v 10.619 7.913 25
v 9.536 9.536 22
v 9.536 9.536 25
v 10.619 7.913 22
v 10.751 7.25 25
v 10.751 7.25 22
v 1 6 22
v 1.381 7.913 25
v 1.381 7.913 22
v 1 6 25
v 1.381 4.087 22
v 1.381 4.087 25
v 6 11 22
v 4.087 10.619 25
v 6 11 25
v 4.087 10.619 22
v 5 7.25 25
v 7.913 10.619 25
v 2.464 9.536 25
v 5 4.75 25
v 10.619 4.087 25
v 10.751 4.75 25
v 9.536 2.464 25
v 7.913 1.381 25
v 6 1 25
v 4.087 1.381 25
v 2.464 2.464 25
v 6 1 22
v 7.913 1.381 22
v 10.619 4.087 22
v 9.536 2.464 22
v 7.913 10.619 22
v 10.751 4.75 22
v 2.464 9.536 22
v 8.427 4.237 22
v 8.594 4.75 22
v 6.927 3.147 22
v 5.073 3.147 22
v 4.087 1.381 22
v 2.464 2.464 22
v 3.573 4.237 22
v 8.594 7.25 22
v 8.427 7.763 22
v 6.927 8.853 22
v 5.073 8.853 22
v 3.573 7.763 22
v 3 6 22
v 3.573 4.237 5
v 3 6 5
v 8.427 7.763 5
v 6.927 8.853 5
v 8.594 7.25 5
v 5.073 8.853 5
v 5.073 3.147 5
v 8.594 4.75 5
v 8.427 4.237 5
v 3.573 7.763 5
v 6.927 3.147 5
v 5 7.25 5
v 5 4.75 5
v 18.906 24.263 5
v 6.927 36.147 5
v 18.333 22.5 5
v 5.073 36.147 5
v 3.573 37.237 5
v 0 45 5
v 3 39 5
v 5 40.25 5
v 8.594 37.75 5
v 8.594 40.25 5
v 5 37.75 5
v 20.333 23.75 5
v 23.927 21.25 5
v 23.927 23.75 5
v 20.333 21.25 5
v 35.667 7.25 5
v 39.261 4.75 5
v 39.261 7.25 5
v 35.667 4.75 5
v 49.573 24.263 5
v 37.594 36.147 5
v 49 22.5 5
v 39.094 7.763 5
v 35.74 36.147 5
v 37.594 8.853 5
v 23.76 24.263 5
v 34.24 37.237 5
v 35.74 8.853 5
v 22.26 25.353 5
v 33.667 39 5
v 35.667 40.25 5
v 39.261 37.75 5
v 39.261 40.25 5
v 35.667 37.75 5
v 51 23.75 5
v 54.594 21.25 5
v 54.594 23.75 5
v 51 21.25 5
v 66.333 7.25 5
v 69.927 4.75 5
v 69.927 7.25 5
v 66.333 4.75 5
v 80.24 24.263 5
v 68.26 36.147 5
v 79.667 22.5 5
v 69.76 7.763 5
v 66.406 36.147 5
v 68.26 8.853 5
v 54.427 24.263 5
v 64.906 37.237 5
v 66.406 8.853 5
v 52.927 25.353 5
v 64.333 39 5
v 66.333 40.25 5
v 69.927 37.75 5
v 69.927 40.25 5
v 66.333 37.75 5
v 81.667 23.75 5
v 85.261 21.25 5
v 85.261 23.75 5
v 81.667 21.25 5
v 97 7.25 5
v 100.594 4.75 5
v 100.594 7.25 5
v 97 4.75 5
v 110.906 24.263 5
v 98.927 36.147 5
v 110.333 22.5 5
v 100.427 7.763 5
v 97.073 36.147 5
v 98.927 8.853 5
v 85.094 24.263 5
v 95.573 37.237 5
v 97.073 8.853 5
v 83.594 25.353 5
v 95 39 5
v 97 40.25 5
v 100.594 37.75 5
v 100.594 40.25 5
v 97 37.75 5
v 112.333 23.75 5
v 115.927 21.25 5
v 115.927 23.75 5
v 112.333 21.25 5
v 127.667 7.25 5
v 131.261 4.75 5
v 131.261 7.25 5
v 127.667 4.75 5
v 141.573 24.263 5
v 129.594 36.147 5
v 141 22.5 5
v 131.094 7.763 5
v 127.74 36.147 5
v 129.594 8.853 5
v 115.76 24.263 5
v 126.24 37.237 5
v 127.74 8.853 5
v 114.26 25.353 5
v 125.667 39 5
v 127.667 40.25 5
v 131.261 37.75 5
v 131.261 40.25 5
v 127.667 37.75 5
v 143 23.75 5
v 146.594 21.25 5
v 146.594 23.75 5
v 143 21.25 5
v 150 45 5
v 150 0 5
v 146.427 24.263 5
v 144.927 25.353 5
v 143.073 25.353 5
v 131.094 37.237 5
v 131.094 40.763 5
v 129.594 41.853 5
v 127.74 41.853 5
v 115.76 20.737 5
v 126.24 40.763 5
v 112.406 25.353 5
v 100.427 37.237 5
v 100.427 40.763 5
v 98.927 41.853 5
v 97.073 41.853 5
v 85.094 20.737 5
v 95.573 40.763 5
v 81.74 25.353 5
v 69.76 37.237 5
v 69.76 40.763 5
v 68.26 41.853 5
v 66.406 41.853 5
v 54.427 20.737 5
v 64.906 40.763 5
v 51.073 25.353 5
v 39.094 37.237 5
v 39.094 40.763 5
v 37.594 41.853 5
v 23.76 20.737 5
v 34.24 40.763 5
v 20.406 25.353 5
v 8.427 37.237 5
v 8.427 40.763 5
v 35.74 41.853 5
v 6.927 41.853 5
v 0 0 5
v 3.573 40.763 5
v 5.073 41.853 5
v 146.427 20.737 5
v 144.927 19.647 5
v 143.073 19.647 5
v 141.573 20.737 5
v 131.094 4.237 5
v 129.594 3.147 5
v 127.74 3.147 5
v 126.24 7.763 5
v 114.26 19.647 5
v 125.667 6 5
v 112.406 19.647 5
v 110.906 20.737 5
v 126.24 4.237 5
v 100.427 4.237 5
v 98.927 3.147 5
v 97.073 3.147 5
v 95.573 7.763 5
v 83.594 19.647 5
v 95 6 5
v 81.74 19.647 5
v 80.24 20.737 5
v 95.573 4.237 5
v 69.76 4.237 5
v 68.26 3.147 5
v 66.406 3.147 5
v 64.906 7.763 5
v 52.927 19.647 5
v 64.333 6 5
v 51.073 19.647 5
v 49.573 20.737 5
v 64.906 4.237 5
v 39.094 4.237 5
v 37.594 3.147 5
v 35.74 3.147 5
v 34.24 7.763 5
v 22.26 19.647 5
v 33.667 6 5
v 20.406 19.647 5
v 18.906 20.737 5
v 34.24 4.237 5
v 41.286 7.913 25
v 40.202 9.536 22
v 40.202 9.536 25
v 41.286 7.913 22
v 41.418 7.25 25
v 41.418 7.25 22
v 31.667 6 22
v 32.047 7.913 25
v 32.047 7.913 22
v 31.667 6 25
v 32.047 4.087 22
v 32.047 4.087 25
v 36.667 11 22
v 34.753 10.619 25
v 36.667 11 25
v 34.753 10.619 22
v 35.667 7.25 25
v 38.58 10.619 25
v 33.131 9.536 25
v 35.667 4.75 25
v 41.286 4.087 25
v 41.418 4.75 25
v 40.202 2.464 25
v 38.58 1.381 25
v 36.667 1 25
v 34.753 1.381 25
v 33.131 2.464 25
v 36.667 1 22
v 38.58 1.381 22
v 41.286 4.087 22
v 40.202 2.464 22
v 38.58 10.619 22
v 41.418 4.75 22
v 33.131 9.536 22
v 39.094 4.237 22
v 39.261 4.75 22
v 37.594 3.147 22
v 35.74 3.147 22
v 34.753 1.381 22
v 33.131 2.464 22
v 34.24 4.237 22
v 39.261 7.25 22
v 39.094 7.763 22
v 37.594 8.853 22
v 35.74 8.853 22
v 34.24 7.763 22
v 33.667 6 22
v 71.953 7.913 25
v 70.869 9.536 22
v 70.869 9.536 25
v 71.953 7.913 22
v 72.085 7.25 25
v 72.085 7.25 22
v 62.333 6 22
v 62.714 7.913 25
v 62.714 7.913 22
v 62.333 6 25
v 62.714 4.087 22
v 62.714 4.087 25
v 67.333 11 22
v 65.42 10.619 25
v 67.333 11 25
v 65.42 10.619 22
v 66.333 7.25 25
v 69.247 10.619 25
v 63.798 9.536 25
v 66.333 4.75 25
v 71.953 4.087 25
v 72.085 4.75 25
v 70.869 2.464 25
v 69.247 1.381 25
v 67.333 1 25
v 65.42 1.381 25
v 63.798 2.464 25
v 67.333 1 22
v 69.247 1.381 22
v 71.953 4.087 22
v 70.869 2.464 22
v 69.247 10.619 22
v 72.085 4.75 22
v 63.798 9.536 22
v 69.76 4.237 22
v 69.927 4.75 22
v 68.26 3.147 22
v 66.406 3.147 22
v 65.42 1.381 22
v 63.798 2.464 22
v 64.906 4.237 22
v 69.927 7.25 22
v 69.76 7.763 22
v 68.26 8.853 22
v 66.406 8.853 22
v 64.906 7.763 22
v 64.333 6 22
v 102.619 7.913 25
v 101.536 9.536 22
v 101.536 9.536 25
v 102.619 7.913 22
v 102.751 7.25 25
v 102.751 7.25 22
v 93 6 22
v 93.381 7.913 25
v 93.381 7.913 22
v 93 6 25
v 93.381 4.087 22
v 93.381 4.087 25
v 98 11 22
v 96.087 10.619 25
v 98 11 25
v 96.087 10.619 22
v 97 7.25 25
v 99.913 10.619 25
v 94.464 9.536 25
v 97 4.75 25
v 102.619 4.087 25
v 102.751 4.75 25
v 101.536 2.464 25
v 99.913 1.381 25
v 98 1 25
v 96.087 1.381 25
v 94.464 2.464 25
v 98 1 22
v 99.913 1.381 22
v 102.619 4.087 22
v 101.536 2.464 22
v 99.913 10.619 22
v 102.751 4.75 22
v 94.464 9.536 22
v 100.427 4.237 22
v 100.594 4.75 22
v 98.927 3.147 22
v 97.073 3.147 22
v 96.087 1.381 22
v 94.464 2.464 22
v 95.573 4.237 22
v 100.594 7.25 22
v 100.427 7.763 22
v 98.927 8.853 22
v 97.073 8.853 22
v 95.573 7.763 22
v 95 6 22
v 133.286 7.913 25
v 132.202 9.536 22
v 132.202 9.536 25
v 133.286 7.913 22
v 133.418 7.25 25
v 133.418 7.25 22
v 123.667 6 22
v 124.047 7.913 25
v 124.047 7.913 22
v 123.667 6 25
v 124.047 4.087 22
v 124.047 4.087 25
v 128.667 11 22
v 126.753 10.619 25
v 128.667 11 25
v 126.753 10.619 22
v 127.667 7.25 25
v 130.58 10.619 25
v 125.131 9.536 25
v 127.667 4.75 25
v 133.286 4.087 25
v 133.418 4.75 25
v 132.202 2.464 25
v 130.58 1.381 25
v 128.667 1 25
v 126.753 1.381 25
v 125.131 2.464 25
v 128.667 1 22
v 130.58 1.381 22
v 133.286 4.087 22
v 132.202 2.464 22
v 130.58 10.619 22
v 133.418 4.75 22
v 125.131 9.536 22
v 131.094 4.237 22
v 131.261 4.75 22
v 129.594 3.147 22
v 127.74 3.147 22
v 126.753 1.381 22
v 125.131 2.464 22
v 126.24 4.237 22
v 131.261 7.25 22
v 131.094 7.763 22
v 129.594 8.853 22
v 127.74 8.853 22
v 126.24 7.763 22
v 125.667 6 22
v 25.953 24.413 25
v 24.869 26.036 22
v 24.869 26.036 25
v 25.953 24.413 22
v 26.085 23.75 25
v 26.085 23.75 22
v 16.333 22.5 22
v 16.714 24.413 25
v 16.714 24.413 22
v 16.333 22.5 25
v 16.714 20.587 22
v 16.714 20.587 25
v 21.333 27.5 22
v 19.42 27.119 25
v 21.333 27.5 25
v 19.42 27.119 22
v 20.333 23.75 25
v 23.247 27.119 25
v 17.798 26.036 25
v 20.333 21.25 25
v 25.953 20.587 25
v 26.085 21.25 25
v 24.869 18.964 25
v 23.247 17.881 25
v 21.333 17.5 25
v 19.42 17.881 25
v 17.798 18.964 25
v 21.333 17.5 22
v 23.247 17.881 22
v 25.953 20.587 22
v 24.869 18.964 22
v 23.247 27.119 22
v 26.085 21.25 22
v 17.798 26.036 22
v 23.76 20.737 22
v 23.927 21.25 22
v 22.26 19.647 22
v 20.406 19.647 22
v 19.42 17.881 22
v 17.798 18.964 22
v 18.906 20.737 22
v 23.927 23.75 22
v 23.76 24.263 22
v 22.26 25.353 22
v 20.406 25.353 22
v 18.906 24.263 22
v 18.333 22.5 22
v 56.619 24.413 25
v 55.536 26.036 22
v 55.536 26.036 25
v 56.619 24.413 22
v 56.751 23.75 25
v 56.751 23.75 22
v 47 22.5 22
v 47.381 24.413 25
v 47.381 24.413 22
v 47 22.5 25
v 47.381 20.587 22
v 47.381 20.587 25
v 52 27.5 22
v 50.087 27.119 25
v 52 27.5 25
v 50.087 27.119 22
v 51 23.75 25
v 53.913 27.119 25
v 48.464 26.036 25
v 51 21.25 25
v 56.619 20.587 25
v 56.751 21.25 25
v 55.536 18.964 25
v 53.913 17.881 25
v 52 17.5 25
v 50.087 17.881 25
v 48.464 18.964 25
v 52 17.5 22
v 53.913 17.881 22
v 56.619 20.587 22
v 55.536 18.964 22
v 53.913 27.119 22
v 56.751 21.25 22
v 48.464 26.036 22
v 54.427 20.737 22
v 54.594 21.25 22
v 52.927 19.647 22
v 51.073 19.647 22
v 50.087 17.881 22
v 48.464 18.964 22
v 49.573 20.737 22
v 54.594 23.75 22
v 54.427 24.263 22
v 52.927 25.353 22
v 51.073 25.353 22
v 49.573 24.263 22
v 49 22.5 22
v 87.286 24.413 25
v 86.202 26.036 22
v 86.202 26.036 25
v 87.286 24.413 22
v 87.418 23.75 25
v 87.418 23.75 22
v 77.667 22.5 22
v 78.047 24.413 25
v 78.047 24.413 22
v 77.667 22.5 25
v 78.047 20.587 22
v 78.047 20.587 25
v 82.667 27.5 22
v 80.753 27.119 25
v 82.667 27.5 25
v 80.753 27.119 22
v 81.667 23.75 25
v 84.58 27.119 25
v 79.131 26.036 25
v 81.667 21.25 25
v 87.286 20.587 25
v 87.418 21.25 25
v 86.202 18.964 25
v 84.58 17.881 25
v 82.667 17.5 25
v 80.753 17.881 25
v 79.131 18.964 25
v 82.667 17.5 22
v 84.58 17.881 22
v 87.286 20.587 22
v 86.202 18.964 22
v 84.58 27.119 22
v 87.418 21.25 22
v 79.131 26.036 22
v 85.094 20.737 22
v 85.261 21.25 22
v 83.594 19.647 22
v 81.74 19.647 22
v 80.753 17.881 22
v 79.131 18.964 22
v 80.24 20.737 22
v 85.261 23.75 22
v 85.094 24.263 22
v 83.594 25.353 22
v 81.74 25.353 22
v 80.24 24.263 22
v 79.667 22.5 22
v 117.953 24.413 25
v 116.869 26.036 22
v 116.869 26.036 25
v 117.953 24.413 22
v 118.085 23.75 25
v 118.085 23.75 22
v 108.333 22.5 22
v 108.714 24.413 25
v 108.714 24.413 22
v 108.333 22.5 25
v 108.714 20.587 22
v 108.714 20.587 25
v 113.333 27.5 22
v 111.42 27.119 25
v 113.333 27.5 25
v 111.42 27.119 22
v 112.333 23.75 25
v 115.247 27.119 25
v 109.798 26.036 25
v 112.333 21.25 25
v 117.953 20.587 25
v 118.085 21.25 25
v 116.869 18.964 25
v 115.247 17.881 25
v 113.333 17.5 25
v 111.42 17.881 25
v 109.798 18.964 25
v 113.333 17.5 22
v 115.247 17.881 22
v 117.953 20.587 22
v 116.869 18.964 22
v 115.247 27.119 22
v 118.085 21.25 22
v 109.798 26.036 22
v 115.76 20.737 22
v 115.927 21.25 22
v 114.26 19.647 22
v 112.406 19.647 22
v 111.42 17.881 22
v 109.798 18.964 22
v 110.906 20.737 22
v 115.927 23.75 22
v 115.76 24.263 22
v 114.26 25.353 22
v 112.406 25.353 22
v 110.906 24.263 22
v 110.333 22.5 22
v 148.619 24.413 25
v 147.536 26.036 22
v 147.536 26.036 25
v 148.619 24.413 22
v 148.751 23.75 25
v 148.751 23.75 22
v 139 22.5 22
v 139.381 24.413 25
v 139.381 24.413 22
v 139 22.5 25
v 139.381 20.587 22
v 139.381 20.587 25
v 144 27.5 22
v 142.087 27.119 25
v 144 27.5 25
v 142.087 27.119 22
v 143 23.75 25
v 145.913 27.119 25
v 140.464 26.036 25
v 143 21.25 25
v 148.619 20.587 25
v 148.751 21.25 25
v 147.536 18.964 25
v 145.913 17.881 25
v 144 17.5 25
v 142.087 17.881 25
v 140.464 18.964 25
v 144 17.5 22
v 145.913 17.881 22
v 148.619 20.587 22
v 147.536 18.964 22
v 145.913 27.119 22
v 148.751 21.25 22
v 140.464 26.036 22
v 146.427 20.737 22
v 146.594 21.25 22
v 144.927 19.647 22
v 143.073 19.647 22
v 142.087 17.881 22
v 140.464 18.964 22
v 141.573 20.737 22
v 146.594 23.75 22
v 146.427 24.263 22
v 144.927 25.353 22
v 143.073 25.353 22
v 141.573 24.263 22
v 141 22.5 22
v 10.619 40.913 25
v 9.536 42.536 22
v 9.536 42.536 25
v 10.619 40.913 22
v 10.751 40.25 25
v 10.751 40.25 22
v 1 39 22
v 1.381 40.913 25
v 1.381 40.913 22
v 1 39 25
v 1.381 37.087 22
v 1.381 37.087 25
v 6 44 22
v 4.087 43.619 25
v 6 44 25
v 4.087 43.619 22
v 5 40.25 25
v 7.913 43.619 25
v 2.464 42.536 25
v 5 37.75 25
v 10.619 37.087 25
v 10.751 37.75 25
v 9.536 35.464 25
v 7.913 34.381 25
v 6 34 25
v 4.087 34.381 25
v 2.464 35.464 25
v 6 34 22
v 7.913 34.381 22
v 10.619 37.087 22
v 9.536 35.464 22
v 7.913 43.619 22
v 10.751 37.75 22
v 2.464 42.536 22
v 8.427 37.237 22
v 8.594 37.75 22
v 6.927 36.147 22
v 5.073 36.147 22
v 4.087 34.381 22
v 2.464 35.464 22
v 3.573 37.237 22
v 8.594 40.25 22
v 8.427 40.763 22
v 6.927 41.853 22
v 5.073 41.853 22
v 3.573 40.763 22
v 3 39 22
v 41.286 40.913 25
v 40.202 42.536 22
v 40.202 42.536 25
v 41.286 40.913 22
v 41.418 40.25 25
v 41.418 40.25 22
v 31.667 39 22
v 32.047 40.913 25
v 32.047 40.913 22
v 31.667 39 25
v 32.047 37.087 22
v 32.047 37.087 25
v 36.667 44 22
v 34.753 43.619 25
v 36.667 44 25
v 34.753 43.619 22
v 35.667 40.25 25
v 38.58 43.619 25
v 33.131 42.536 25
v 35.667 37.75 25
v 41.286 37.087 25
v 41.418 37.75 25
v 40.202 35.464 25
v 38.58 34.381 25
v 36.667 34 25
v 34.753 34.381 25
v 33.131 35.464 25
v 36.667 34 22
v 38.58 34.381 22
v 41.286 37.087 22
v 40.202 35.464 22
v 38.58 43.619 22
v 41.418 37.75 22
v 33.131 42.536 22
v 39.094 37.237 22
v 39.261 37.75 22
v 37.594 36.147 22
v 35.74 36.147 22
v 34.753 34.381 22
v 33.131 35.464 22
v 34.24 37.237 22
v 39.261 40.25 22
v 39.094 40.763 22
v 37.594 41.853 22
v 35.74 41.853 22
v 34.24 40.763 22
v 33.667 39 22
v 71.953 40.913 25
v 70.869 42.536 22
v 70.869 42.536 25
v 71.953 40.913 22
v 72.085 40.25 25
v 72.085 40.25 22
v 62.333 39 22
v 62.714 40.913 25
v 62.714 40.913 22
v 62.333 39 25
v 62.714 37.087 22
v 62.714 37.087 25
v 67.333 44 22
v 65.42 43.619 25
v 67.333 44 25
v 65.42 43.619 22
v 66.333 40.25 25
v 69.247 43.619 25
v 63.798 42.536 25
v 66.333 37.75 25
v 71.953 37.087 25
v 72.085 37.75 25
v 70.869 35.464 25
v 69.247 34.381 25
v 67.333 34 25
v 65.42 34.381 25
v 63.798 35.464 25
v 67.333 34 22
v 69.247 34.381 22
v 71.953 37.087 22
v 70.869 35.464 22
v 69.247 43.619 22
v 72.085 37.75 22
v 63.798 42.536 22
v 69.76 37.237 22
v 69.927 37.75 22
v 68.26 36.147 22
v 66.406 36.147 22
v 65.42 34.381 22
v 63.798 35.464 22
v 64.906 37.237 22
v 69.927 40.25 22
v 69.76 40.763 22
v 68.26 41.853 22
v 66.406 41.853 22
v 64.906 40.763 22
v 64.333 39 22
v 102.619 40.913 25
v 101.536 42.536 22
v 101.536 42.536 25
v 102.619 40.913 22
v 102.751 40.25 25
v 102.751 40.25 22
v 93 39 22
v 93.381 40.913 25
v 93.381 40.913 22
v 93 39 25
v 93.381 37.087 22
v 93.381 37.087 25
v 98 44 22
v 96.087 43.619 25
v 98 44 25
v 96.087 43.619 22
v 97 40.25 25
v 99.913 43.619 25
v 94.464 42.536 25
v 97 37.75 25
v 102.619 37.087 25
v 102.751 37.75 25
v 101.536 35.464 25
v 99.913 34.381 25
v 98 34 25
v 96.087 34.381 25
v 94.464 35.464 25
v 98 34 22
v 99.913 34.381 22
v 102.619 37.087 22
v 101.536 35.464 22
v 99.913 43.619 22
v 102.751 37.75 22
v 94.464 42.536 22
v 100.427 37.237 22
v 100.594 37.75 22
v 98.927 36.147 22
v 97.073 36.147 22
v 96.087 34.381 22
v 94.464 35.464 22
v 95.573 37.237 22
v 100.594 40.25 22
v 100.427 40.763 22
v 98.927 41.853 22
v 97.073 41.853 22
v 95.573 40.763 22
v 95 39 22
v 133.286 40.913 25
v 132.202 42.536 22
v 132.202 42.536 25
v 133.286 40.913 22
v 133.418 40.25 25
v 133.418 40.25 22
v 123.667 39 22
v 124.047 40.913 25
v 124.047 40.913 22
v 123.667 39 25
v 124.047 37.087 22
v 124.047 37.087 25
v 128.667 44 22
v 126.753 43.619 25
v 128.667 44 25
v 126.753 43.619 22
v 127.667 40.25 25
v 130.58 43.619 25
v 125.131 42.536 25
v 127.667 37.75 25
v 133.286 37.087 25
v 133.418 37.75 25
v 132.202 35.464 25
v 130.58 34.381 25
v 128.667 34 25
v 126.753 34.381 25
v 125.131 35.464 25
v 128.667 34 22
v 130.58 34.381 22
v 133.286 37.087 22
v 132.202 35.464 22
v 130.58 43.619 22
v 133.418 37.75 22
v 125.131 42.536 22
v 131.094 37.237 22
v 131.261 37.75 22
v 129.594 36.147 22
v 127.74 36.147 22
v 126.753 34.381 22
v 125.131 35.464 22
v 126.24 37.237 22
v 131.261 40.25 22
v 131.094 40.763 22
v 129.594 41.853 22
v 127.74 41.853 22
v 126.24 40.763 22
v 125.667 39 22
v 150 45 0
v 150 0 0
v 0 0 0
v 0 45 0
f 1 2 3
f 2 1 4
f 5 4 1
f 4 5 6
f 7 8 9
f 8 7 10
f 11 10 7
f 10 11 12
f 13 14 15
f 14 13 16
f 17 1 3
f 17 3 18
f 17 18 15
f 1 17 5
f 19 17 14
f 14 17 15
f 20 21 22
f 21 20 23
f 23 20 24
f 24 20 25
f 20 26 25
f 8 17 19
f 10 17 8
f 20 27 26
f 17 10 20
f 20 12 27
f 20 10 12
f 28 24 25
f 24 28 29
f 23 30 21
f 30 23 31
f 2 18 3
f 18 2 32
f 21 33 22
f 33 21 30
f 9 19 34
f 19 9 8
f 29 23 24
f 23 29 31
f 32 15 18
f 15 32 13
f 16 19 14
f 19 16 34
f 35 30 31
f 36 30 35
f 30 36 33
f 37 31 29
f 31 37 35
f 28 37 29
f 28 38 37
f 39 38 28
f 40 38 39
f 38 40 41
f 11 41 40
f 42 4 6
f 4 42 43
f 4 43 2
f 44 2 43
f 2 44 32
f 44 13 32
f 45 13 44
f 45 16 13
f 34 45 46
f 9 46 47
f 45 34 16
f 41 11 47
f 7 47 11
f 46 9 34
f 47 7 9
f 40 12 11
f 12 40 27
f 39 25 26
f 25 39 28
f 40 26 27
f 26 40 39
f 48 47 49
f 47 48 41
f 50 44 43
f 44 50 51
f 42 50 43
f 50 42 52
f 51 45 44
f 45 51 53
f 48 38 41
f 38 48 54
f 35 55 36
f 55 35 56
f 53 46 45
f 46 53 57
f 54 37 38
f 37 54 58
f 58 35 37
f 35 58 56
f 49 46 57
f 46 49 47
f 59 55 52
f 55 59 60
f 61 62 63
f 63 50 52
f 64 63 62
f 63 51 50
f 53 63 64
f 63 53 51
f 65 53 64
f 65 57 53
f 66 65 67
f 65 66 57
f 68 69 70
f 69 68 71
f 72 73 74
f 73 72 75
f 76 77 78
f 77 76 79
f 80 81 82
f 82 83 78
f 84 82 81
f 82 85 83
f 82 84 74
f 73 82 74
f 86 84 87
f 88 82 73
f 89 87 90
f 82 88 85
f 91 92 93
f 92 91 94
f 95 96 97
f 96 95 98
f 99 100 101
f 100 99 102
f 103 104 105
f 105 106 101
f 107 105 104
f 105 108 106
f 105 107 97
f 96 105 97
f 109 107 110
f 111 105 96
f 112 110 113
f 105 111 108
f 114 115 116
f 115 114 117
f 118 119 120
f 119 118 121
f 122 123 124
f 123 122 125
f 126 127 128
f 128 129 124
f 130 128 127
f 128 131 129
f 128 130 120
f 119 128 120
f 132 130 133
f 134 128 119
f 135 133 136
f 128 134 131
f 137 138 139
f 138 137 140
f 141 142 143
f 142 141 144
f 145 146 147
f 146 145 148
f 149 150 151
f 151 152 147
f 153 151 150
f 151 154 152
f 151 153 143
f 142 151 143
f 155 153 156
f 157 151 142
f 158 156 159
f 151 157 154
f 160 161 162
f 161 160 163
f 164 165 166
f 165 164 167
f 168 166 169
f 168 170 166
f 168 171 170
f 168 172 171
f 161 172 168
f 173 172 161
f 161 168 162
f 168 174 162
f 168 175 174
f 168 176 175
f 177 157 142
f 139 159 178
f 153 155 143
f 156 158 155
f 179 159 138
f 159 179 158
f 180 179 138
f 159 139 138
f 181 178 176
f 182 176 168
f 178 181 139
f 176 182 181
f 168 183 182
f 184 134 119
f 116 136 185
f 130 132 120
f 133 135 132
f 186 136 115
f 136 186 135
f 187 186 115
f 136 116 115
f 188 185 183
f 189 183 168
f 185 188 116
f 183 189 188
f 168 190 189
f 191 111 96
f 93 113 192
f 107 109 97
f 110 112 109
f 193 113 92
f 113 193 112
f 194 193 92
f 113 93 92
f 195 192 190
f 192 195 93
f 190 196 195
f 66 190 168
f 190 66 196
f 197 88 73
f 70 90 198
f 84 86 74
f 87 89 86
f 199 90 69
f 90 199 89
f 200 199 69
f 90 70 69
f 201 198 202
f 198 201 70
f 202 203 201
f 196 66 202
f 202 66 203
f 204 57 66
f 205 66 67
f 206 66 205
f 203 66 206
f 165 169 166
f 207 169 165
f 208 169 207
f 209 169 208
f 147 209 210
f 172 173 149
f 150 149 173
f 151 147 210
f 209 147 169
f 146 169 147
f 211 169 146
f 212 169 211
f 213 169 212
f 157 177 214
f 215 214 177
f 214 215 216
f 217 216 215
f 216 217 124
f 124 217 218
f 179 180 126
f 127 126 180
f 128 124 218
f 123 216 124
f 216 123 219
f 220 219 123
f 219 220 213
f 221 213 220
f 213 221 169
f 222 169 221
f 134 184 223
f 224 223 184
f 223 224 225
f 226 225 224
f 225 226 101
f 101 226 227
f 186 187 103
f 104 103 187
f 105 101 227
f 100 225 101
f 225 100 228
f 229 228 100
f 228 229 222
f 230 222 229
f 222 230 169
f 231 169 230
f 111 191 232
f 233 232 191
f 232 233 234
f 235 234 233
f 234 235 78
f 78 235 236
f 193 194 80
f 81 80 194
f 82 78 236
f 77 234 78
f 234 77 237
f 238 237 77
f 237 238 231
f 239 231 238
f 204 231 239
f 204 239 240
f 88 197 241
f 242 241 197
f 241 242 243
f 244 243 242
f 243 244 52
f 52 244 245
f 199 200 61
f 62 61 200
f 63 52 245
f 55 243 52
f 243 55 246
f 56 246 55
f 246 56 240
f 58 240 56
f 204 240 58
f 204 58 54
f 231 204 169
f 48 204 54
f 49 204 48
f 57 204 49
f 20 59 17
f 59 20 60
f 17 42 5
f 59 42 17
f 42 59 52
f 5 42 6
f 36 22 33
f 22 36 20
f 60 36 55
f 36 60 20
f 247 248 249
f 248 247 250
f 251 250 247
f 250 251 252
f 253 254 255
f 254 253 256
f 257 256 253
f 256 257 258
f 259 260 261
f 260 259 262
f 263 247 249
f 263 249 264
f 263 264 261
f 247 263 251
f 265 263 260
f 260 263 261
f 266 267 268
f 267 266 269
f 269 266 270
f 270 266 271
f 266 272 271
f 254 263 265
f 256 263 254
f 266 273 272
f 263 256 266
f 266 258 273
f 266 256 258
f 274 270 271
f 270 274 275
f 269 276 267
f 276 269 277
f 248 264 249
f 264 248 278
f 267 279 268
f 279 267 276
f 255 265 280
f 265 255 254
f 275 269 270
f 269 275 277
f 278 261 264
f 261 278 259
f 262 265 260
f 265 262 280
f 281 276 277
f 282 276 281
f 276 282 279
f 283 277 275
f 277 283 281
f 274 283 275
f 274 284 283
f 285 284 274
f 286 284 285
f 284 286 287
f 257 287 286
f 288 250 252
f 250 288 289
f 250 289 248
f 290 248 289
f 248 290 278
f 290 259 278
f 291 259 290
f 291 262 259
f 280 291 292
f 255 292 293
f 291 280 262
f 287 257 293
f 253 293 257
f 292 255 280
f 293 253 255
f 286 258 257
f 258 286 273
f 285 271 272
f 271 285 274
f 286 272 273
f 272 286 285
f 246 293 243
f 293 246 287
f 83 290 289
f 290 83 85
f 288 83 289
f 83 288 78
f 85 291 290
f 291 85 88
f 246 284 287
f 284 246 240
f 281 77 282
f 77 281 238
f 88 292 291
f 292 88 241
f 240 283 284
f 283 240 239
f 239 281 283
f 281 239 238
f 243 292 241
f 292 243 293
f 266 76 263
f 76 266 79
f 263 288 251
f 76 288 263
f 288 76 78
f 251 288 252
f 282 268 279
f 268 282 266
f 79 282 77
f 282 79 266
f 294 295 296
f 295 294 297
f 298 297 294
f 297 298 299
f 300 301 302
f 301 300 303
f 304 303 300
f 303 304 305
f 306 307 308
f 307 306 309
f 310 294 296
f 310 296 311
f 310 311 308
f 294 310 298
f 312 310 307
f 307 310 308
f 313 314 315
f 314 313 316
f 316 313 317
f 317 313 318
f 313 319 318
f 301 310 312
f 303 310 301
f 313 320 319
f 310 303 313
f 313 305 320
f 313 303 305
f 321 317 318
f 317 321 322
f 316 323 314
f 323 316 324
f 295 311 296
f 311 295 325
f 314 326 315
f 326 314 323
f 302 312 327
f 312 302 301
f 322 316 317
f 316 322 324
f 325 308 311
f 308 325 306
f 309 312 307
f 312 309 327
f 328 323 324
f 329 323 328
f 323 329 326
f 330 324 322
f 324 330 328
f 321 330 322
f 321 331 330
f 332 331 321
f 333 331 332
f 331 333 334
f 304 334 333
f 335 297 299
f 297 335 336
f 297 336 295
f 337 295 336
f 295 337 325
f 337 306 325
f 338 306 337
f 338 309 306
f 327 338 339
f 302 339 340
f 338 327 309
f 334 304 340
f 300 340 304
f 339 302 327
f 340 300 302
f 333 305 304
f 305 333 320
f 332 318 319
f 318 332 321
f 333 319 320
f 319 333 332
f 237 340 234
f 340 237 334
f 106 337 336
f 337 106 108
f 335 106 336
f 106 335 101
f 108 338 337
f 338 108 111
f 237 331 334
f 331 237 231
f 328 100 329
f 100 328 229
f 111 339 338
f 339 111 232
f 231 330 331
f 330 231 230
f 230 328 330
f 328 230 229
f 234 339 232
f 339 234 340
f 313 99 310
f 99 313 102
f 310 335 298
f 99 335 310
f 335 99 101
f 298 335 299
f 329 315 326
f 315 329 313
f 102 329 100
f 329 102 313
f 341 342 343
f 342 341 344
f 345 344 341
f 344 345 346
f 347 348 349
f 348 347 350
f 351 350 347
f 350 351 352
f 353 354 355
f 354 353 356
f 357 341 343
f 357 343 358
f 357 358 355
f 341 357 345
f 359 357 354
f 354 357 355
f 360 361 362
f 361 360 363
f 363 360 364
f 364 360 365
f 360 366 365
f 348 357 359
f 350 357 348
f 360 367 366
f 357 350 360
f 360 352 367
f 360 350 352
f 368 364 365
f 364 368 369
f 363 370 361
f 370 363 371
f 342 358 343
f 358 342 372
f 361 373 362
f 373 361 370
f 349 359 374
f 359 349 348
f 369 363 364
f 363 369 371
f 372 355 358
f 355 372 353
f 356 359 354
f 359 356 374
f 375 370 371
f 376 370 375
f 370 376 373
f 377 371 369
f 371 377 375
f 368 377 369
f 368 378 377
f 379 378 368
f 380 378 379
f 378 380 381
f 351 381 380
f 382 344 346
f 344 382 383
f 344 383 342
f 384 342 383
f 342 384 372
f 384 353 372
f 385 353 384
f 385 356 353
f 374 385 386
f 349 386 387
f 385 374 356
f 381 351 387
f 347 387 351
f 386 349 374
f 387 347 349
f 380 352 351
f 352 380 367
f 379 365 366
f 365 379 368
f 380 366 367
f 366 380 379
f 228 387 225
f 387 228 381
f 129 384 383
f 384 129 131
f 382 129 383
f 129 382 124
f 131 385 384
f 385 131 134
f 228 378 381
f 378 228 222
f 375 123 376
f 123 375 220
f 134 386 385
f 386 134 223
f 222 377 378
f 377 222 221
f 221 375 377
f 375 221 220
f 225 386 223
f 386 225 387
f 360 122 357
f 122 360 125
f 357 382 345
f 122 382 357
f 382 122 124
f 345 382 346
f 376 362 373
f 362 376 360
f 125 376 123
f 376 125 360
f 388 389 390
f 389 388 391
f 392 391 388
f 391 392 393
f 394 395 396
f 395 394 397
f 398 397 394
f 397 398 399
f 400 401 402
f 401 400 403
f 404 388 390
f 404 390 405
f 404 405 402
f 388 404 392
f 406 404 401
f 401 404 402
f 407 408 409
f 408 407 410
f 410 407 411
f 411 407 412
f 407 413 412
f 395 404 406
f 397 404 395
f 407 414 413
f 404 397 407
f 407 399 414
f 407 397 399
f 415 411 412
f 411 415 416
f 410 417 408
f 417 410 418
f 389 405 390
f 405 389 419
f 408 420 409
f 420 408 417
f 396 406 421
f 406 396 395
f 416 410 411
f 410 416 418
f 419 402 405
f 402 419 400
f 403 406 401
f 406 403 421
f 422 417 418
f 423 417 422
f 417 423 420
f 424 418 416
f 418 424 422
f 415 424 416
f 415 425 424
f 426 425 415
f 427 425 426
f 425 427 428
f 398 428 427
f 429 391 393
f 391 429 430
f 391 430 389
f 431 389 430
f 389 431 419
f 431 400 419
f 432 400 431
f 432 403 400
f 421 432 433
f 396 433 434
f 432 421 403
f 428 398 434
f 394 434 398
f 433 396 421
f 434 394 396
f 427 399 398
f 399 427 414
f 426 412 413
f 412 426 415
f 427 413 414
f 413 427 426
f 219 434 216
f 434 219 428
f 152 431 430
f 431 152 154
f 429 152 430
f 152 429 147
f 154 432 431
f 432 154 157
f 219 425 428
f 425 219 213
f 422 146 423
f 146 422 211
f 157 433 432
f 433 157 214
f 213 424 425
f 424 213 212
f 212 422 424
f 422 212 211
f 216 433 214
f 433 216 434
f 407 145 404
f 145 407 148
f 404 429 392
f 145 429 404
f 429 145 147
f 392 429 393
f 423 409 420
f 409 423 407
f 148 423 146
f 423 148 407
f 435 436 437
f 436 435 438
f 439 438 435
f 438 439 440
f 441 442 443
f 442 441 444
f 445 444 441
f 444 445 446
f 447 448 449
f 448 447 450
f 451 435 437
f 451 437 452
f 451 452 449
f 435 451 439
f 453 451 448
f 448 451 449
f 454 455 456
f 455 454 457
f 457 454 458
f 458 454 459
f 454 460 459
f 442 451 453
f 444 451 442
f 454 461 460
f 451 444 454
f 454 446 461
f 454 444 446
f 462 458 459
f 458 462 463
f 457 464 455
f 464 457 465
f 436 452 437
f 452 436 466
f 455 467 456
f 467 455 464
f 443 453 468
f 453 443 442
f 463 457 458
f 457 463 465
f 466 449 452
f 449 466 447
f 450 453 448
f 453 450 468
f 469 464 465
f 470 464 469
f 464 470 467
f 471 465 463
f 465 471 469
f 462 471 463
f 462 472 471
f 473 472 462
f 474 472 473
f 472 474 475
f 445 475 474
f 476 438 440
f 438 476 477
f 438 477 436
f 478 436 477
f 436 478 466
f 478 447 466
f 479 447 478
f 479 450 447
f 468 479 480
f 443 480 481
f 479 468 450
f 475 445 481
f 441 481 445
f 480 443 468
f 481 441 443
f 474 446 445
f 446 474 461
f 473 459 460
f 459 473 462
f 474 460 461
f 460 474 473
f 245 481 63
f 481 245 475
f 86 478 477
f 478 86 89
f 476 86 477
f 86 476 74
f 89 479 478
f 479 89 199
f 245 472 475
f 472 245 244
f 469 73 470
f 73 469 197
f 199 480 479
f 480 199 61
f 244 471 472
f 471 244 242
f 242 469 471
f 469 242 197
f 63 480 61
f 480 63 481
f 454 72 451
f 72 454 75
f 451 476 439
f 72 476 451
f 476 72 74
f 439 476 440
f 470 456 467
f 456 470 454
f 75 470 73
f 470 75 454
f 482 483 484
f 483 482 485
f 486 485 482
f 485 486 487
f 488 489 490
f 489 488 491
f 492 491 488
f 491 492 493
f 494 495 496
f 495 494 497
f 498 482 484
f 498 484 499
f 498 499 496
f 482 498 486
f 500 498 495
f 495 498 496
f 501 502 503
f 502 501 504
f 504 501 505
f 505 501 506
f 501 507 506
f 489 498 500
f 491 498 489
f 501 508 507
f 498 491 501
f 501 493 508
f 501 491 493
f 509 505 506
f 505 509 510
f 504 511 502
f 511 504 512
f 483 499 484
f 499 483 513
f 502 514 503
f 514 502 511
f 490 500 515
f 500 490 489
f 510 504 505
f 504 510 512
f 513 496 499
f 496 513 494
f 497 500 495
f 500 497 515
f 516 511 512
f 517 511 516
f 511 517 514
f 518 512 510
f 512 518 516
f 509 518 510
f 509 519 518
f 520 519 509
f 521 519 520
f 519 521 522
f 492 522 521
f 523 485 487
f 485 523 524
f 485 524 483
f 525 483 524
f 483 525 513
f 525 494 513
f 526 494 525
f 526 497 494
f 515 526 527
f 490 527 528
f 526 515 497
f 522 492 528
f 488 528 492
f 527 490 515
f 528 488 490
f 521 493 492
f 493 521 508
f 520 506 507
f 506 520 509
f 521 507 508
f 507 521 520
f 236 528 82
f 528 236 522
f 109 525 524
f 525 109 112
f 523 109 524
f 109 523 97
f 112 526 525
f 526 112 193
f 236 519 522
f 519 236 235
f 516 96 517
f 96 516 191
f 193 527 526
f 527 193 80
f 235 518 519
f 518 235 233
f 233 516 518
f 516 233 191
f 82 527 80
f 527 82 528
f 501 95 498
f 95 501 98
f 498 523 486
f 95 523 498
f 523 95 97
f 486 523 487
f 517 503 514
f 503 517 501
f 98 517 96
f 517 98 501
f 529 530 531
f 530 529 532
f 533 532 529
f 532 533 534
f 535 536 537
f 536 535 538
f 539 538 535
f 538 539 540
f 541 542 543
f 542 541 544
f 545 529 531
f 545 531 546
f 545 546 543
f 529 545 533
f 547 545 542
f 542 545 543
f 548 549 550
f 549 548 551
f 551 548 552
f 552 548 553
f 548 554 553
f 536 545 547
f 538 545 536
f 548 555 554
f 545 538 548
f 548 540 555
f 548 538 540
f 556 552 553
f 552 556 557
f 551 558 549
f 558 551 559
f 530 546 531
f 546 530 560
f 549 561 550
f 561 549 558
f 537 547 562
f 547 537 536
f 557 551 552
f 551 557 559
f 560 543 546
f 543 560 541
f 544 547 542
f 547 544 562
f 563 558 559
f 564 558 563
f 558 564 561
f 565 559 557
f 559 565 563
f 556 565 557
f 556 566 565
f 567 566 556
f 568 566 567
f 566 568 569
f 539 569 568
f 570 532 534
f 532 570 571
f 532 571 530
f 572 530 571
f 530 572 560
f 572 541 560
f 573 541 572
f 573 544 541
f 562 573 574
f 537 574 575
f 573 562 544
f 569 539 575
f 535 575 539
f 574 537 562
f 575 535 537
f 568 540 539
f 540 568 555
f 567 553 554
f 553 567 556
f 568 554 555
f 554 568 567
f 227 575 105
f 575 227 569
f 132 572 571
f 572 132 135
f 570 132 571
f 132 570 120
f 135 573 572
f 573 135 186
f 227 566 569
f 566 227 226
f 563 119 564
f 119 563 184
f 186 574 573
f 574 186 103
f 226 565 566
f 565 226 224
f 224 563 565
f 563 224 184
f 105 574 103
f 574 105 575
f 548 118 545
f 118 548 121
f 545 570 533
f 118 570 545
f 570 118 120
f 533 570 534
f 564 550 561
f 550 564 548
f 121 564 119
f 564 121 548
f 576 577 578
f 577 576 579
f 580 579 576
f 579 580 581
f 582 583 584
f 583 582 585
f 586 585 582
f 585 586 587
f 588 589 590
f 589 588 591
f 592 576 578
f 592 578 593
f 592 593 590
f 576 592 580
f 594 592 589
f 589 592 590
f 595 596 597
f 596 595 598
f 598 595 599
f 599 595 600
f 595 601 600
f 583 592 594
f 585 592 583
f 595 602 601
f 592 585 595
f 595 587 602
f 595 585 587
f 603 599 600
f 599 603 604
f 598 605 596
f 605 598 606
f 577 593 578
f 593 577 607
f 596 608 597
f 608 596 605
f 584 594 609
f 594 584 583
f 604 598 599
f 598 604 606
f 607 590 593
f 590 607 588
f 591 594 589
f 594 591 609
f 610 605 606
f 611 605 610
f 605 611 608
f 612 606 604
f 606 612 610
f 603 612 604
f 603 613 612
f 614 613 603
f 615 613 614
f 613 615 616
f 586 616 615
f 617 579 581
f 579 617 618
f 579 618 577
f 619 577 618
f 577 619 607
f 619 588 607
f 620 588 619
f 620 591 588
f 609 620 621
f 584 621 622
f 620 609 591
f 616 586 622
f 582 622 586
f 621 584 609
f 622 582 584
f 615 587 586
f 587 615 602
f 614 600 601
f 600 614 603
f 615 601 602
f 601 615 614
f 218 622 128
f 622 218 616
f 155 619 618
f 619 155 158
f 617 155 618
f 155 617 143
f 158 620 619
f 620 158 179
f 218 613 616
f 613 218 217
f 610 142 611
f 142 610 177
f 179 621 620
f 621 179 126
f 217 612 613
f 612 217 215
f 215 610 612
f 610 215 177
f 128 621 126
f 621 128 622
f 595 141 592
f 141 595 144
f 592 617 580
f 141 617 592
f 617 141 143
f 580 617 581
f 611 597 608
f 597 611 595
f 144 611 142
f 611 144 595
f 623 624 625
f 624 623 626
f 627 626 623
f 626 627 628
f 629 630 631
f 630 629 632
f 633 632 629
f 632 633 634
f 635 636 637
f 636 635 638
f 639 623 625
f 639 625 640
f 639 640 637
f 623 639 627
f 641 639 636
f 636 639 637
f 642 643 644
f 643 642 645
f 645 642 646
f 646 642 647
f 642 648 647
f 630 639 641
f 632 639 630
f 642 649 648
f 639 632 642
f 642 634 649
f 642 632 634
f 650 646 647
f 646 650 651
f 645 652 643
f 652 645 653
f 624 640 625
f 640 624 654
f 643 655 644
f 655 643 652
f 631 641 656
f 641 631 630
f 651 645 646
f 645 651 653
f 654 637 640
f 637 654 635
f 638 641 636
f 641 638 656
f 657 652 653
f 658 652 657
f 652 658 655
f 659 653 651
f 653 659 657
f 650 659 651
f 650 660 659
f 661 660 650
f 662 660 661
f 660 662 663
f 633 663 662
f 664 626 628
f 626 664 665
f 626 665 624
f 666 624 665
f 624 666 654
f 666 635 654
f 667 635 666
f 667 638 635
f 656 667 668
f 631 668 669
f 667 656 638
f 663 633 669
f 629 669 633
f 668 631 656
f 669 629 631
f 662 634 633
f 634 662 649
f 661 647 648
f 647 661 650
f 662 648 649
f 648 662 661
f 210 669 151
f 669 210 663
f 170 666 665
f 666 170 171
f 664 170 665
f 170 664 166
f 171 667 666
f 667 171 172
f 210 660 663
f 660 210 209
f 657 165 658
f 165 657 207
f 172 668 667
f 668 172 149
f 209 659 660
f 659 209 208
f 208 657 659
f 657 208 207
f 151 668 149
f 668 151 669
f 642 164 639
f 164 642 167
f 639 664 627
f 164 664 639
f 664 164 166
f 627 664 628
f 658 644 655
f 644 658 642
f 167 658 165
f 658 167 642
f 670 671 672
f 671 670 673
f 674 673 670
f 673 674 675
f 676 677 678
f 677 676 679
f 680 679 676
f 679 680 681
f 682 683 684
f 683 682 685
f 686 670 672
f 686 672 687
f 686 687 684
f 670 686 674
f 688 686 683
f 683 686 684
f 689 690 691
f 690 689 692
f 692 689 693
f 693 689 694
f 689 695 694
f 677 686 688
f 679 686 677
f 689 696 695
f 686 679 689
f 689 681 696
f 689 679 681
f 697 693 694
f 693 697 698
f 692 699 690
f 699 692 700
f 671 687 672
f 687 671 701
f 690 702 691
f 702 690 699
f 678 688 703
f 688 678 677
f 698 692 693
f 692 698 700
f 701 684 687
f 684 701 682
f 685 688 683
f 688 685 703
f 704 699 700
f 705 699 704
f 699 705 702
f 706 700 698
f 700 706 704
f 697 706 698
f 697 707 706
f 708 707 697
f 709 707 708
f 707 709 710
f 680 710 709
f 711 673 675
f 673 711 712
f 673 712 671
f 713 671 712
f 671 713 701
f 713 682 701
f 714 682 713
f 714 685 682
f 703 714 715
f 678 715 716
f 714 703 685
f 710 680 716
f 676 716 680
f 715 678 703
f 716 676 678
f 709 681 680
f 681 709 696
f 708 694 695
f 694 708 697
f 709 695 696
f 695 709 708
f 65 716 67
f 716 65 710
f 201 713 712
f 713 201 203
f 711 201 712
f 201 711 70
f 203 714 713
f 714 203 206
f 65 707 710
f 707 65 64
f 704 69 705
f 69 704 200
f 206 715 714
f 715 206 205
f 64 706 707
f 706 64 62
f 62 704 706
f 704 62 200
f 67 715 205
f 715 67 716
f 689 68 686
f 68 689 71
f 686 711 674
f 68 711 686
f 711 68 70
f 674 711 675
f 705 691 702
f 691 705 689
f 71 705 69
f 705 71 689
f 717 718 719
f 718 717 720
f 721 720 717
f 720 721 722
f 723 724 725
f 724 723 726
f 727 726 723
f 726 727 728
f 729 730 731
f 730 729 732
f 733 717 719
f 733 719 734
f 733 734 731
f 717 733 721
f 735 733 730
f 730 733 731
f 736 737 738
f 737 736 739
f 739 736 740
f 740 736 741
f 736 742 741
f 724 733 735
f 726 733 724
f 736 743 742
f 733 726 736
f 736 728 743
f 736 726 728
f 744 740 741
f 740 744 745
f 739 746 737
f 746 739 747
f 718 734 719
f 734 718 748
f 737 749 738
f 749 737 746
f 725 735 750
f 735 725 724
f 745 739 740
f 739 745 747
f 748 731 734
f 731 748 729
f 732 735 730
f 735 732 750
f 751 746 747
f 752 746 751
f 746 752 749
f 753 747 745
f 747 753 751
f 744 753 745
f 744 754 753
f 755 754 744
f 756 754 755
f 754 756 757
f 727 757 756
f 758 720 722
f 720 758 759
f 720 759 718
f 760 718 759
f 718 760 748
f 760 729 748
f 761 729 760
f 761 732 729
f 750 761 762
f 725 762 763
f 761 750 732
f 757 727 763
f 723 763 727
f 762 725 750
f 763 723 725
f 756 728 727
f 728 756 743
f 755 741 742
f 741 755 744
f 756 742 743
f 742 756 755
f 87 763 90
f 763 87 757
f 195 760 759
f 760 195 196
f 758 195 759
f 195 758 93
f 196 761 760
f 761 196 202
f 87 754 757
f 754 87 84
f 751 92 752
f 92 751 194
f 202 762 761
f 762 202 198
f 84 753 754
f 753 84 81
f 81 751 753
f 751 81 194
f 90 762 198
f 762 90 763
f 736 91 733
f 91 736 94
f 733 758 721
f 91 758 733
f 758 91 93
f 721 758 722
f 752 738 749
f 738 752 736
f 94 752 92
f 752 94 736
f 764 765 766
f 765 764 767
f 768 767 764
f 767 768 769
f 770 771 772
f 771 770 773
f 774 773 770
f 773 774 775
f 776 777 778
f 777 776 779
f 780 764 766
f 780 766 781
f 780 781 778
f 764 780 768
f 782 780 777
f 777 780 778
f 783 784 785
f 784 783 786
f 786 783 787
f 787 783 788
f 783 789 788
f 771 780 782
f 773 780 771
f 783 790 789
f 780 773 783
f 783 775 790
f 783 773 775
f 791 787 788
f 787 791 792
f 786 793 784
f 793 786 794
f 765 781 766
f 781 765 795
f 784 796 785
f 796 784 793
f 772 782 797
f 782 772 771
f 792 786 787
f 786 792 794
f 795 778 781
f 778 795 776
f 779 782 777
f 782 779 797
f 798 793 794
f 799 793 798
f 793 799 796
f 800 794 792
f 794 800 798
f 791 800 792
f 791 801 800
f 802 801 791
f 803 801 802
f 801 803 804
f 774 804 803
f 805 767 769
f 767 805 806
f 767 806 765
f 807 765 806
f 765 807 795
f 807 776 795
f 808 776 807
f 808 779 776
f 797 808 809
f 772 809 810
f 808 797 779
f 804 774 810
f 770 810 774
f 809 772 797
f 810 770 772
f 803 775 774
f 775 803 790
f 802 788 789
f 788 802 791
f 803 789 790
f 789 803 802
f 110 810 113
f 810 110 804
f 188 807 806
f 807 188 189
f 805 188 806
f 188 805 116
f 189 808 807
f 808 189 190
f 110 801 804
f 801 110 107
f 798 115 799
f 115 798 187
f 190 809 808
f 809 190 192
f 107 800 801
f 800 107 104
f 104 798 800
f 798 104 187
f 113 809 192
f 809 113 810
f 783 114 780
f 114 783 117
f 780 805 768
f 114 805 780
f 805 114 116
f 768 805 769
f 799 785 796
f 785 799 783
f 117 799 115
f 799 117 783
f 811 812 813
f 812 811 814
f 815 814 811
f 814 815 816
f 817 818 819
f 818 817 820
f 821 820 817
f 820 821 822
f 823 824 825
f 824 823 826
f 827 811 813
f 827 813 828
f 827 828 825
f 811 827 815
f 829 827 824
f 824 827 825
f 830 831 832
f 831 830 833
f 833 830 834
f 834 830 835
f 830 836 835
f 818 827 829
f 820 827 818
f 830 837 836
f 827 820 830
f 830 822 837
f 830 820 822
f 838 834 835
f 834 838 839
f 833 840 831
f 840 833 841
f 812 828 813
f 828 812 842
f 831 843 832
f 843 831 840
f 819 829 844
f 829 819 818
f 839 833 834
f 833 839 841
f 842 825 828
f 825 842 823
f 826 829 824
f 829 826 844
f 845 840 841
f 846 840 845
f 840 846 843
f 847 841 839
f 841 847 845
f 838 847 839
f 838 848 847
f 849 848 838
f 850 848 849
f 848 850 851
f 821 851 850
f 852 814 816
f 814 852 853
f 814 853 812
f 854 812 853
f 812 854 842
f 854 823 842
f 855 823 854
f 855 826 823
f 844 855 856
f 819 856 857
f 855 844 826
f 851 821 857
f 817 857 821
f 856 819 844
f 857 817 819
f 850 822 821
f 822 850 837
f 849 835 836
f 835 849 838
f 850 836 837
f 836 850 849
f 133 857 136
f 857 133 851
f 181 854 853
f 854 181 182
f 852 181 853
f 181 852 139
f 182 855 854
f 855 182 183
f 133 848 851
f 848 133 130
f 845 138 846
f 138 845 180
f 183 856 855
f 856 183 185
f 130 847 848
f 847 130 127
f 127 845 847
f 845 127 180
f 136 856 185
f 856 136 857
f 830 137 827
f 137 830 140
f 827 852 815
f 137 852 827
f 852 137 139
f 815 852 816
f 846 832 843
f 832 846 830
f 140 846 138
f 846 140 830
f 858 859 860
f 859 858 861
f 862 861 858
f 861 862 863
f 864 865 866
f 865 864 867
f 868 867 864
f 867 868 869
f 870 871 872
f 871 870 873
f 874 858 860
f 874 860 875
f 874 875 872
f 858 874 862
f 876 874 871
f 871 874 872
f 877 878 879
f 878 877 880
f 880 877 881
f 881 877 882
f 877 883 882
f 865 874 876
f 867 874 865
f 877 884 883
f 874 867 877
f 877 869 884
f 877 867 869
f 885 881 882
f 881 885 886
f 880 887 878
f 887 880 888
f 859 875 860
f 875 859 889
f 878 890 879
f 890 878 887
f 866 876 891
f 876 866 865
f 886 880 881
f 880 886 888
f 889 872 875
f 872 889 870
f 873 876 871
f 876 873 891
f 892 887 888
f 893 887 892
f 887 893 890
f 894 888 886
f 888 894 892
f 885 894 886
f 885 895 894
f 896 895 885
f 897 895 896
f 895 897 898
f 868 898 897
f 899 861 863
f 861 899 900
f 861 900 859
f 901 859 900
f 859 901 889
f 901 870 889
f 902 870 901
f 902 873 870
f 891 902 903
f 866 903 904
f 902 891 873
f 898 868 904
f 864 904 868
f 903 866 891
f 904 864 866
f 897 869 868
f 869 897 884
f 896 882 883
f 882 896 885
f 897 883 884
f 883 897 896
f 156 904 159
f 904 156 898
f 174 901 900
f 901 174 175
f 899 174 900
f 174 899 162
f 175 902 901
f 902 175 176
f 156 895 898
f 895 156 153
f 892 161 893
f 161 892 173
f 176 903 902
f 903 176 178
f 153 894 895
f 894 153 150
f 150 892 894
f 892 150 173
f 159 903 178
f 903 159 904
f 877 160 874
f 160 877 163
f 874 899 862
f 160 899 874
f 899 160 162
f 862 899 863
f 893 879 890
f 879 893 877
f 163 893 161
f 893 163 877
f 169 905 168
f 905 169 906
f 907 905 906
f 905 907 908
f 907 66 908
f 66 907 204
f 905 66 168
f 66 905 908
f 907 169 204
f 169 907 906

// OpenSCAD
//Size of base X
base_Y = 45; // [10:500]

//Size of base Y
base_X = 150; // [10:500]

//Thickness of base
base_thickness = 5;

//Peg thickness
peg_thickness = 3; // [1:10]

//Peg height
peg_height = 20; // [10:50]

//Gap width in peg
gap_width = 2.5;

//Number of pegs on X axis
X_pegs = 5;

//Width of step on top of peg
step_width = 2; // [0:5]

//% of peg height for step
step_percent = 15; // [5:90]

module core()
{
translate([0,0,(peg_height+base_thickness)-peg_height*(step_percent/100)])cylinder(peg_height*(step_percent/100),peg_thickness+step_width,peg_thickness+step_width);
translate([0,0,base_thickness])cylinder(peg_height,peg_thickness,peg_thickness);
}

module peg()
{
difference()
{core();
translate([-peg_thickness/3,-gap_width/2,base_thickness])cube([peg_thickness*3,gap_width,peg_height]);
}
}
cube([base_X,base_Y,base_thickness]);
peg_line();
translate([((base_X-peg_thickness*4)/(X_pegs-.5))*.5,((base_Y-peg_thickness*4)/2),0])peg_line();
translate([0,base_Y-(peg_thickness*4),0])peg_line();
module peg_line()
{
for (i = [0 : X_pegs-1] ){
translate([((base_X-peg_thickness*4)/(X_pegs-.5))*(i)+peg_thickness*2,peg_thickness*2,0]) peg();
}
}
